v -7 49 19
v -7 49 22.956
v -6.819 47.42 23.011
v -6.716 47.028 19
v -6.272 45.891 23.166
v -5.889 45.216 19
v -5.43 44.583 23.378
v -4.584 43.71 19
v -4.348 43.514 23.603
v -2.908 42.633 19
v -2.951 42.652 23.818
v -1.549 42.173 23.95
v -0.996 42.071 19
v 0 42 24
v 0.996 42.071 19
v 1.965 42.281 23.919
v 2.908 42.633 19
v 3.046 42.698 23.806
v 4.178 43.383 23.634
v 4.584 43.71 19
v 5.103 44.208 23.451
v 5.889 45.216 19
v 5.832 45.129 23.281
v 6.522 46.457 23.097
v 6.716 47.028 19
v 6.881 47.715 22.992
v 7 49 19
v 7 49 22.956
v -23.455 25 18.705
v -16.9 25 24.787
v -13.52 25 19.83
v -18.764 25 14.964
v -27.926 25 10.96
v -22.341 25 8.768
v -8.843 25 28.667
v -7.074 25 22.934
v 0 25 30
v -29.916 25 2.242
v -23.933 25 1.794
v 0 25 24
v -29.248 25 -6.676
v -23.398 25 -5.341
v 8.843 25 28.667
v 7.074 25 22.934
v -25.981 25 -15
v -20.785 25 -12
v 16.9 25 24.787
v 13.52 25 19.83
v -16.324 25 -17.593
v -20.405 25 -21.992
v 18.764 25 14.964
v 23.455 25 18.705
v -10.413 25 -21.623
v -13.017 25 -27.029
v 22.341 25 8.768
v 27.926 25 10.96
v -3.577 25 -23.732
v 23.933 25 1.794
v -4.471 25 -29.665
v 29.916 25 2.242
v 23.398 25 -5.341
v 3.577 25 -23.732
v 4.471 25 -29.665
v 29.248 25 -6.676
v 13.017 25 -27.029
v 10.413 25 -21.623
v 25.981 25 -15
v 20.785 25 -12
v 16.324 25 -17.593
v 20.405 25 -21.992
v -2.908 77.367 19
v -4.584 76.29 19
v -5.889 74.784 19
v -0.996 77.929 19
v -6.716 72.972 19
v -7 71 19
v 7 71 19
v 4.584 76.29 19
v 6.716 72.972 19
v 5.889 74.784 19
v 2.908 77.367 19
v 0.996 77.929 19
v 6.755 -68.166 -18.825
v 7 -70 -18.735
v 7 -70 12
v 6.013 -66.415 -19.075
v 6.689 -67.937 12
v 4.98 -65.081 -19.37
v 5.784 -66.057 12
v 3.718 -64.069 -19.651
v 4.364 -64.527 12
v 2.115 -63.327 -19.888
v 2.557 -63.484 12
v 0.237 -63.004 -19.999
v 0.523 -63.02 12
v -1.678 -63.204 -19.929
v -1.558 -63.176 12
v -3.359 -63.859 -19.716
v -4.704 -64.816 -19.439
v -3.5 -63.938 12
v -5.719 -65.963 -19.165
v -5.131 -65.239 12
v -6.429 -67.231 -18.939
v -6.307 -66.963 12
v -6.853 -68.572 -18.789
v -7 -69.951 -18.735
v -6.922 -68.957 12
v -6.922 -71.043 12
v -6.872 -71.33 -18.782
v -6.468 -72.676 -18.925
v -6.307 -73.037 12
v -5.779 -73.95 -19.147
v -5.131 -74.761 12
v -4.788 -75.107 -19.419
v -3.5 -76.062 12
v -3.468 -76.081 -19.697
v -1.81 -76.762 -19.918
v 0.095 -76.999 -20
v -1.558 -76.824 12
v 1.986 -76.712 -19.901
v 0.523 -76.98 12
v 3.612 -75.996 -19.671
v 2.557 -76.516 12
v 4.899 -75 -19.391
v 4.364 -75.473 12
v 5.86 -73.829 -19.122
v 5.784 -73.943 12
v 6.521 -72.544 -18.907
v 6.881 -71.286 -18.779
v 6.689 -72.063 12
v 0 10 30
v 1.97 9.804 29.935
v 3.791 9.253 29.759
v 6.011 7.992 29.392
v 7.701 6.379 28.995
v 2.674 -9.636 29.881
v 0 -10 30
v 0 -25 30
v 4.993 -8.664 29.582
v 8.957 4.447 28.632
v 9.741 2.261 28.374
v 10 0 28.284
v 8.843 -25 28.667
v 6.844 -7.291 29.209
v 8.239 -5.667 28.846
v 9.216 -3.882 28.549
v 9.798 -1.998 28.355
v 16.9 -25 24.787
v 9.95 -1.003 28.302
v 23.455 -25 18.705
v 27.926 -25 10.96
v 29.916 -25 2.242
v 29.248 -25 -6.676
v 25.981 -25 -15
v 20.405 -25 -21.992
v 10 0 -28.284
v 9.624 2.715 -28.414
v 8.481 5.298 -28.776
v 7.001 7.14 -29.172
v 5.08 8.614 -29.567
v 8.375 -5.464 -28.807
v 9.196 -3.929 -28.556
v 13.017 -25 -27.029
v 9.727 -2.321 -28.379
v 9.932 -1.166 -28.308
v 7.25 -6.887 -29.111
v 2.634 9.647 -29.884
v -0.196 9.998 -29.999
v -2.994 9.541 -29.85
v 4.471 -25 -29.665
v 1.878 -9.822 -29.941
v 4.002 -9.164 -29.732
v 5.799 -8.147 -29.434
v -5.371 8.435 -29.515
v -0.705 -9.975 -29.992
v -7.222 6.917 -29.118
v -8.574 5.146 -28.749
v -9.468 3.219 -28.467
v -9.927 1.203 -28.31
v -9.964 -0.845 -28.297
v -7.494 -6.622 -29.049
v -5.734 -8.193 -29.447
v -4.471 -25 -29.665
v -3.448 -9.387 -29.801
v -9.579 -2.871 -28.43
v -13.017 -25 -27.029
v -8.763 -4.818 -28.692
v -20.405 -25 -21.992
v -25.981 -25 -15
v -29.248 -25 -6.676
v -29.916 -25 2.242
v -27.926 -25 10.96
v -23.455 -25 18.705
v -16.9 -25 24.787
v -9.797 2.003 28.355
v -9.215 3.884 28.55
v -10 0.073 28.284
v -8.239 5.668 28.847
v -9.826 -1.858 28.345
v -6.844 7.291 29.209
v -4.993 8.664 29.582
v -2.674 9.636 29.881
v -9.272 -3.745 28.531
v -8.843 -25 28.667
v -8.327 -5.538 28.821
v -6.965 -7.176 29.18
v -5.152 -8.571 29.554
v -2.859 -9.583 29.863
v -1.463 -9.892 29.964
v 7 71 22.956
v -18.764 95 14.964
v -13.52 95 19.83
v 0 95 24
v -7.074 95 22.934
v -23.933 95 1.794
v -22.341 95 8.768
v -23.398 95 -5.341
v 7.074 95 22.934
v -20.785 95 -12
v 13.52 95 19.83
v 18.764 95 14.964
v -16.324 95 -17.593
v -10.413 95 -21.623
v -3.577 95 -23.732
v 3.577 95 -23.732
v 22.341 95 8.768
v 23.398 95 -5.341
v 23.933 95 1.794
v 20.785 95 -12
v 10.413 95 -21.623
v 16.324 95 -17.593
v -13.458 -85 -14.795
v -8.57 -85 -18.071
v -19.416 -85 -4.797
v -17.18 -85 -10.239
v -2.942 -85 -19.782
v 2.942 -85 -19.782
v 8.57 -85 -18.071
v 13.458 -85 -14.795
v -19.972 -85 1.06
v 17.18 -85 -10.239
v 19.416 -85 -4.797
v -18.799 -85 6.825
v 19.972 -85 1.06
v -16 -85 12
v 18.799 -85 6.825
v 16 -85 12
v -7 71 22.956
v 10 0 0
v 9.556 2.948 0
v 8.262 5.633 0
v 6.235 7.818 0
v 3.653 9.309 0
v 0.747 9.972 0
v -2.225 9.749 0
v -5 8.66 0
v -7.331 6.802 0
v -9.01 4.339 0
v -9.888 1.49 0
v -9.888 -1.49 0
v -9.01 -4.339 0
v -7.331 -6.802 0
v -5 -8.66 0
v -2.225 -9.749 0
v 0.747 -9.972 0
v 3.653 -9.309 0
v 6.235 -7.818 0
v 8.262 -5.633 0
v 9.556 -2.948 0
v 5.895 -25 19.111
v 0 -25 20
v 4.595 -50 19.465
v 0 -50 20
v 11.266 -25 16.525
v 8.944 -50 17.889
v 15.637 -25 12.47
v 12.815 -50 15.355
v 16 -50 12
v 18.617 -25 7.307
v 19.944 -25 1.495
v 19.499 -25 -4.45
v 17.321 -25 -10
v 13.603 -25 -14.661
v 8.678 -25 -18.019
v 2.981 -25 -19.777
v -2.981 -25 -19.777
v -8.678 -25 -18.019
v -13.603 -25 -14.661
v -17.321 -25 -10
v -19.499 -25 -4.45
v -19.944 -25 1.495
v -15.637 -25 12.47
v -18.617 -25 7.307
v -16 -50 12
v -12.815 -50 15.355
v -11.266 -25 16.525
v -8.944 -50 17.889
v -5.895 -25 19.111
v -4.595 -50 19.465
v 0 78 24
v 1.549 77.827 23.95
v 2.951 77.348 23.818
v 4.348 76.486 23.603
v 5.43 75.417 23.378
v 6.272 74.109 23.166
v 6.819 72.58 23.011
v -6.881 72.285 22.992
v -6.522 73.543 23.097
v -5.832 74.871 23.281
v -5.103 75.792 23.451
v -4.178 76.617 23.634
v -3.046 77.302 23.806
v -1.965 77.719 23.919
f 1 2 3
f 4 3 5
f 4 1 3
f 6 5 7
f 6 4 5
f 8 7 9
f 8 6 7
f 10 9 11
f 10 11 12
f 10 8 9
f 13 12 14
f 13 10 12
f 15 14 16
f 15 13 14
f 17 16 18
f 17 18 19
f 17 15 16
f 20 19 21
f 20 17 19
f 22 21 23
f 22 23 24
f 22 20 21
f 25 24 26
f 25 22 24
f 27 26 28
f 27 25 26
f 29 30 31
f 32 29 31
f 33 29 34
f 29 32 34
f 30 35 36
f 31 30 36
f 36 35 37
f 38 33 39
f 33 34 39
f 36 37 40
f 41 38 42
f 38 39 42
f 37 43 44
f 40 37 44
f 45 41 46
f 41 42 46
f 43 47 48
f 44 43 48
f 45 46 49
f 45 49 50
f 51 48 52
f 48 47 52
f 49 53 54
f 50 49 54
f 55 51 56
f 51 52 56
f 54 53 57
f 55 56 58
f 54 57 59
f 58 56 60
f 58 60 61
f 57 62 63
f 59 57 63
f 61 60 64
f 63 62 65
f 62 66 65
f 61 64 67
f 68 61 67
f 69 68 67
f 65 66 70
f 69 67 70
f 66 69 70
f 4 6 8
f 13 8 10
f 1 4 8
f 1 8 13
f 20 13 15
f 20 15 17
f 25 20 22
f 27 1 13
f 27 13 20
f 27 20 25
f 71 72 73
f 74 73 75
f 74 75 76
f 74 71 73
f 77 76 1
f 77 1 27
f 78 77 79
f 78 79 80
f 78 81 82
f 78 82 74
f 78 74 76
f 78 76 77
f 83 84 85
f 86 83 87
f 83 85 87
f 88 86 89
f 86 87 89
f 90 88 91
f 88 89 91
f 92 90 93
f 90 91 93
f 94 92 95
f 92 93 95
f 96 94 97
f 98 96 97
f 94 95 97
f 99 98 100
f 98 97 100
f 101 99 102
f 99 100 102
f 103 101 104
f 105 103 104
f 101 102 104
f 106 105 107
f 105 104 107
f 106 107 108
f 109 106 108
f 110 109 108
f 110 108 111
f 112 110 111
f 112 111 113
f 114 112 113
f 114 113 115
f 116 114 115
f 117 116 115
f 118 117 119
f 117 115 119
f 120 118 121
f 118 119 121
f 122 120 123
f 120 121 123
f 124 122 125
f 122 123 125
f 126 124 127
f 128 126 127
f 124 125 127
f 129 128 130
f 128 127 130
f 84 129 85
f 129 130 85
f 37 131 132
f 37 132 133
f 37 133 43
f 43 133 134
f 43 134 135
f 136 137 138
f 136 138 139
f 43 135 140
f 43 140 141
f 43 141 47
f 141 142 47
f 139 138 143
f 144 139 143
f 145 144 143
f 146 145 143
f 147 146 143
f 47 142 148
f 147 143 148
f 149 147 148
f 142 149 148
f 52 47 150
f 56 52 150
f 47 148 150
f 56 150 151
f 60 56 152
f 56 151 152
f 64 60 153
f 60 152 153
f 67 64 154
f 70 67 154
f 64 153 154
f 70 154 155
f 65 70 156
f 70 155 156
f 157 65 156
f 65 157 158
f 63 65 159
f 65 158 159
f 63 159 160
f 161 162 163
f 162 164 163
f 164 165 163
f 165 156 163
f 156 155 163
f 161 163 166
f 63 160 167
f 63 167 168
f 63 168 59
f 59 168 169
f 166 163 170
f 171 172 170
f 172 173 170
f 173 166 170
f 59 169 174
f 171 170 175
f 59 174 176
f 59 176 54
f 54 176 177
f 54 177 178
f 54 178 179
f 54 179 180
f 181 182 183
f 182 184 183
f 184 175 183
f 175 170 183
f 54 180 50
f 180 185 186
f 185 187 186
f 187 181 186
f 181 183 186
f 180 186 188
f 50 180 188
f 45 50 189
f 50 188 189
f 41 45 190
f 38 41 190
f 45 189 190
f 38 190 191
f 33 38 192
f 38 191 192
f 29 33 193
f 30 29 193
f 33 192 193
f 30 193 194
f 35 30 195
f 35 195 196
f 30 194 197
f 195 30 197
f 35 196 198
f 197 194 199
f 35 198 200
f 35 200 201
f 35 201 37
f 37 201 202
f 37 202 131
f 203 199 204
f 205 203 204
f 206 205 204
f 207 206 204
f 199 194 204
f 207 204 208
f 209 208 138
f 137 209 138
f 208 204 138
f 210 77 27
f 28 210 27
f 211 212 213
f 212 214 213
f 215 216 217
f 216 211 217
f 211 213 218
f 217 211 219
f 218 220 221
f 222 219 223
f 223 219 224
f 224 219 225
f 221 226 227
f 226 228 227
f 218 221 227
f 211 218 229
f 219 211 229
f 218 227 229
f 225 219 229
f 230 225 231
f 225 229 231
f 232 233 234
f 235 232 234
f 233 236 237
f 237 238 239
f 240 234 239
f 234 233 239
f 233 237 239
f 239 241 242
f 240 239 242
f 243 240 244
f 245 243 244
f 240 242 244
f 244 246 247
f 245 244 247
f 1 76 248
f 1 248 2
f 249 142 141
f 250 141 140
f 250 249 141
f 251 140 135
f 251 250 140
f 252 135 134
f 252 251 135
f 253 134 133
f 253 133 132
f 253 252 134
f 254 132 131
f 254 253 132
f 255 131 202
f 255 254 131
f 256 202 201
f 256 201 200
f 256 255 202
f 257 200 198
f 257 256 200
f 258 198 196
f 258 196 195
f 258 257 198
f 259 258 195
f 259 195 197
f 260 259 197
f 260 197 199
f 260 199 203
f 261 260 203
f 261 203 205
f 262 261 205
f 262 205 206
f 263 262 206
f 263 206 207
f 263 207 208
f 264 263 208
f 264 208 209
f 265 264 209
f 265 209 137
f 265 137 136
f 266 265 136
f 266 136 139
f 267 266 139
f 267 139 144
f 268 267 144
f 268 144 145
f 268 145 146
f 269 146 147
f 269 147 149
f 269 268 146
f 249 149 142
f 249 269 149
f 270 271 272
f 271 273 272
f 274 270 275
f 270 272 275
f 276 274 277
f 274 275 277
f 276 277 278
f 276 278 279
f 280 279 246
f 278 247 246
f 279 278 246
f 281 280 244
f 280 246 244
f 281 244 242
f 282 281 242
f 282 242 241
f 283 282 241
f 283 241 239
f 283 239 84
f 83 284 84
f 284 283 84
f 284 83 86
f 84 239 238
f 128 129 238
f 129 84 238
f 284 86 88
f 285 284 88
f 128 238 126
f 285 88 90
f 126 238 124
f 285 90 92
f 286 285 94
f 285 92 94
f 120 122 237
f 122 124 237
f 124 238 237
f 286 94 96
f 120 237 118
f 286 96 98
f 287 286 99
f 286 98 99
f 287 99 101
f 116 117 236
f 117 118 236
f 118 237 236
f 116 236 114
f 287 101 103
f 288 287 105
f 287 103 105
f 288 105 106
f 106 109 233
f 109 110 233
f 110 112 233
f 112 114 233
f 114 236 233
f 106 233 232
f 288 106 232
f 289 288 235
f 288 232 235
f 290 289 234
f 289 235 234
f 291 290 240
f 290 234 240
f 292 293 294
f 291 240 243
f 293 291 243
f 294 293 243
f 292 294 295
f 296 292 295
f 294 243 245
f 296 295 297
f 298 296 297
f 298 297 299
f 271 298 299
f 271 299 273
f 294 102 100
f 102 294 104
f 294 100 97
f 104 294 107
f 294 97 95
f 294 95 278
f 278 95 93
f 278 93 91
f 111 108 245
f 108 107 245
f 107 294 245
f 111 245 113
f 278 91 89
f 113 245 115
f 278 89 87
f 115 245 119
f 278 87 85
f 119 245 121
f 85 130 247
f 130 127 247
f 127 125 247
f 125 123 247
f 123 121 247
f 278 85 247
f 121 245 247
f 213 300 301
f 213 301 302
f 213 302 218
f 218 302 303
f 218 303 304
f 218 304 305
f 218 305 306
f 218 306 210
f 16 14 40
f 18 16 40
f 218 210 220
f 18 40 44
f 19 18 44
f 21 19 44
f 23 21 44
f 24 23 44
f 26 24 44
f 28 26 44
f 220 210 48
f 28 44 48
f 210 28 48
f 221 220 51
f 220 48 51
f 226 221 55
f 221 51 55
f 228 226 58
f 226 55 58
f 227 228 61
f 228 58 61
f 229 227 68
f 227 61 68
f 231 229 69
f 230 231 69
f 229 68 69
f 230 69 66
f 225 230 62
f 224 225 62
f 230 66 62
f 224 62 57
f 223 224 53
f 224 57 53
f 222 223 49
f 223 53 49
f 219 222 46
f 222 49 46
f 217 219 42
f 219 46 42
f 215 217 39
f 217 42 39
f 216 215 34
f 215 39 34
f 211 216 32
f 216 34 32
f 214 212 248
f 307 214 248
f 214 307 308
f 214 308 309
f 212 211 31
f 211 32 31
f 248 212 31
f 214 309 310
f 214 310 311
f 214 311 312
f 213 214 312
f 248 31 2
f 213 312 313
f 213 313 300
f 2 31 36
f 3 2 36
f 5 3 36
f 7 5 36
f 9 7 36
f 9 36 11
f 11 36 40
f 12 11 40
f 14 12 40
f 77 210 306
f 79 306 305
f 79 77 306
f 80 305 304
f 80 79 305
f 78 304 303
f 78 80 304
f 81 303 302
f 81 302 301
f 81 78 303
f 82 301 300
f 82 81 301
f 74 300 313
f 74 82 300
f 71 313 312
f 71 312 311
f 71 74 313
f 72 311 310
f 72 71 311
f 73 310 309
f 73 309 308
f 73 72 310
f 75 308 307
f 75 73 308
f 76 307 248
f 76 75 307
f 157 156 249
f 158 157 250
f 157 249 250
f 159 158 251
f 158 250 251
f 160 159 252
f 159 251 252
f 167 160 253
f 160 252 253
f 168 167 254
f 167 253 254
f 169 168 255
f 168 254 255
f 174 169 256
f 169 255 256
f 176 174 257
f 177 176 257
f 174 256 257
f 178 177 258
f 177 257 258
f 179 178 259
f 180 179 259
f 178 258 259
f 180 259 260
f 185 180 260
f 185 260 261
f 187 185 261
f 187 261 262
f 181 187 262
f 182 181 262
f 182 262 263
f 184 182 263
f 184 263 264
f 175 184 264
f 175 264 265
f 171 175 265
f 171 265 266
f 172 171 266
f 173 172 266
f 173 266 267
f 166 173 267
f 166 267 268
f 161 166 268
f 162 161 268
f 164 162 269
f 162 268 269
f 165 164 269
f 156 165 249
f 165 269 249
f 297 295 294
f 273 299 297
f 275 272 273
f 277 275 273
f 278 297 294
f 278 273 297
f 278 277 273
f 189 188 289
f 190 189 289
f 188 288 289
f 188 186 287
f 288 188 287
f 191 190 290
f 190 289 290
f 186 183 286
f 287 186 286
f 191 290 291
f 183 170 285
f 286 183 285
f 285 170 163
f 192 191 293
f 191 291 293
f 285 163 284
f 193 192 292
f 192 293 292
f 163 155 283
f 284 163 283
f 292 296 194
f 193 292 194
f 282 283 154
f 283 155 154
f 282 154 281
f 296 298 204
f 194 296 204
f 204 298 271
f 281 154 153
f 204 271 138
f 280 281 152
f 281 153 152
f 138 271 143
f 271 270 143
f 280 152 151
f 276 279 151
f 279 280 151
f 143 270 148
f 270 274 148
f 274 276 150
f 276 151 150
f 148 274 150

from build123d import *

# Parameters (mm, degrees)
POCKET_DEPTH         = 35
SKETCH003_R          = 10
SKETCH003_R_2        = 7
POCKET001_DEPTH      = 30.001
POCKET001_DEPTH_BACK = -30.001
POCKET002_DEPTH      = 5


with BuildPart() as part:
    # Sketch → Revolution (revolve)
    with BuildSketch(Plane.YZ):
        Polygon((-25, 20), (-85, 20), (-85, 0), (95, 0), (95, 24), (25, 24), (25, 30), (-25, 30), align=None)
    revolve(axis=Axis((0, 0, 0), (0, 1, 0)))

    # Sketch002 (on Face2 of Revolution) → Pocket (cut)
    with BuildSketch(Plane(origin=(0, -85, 0), x_dir=(0, 0, -1), z_dir=(0, -1, 0))):
        with BuildLine():
            Line((-12, -16), (-12, 16))
            ThreePointArc((-12, 16), (-20, 0), (-12, -16))
        make_face()
    extrude(amount=-POCKET_DEPTH, mode=Mode.SUBTRACT)

    # Sketch003 → Pocket001 (cut, two sides)
    with BuildSketch(Plane.XY) as pocket001_sk:
        Circle(SKETCH003_R)
        with Locations((0, -70)):
            Circle(SKETCH003_R_2)
    extrude(amount=-POCKET001_DEPTH, mode=Mode.SUBTRACT)
    extrude(pocket001_sk.sketch, amount=-POCKET001_DEPTH_BACK, mode=Mode.SUBTRACT)

    # Sketch004 (on DatumPlane) → Pocket002 (cut)
    with BuildSketch(Plane.XY.offset(19)):
        with BuildLine():
            ThreePointArc((7, 71), (0, 78), (-7, 71))
            Line((-7, 71), (-7, 49))
            ThreePointArc((-7, 49), (0, 42), (7, 49))
            Line((7, 71), (7, 49))
        make_face()
    extrude(amount=POCKET002_DEPTH, mode=Mode.SUBTRACT)


solid = part.part
